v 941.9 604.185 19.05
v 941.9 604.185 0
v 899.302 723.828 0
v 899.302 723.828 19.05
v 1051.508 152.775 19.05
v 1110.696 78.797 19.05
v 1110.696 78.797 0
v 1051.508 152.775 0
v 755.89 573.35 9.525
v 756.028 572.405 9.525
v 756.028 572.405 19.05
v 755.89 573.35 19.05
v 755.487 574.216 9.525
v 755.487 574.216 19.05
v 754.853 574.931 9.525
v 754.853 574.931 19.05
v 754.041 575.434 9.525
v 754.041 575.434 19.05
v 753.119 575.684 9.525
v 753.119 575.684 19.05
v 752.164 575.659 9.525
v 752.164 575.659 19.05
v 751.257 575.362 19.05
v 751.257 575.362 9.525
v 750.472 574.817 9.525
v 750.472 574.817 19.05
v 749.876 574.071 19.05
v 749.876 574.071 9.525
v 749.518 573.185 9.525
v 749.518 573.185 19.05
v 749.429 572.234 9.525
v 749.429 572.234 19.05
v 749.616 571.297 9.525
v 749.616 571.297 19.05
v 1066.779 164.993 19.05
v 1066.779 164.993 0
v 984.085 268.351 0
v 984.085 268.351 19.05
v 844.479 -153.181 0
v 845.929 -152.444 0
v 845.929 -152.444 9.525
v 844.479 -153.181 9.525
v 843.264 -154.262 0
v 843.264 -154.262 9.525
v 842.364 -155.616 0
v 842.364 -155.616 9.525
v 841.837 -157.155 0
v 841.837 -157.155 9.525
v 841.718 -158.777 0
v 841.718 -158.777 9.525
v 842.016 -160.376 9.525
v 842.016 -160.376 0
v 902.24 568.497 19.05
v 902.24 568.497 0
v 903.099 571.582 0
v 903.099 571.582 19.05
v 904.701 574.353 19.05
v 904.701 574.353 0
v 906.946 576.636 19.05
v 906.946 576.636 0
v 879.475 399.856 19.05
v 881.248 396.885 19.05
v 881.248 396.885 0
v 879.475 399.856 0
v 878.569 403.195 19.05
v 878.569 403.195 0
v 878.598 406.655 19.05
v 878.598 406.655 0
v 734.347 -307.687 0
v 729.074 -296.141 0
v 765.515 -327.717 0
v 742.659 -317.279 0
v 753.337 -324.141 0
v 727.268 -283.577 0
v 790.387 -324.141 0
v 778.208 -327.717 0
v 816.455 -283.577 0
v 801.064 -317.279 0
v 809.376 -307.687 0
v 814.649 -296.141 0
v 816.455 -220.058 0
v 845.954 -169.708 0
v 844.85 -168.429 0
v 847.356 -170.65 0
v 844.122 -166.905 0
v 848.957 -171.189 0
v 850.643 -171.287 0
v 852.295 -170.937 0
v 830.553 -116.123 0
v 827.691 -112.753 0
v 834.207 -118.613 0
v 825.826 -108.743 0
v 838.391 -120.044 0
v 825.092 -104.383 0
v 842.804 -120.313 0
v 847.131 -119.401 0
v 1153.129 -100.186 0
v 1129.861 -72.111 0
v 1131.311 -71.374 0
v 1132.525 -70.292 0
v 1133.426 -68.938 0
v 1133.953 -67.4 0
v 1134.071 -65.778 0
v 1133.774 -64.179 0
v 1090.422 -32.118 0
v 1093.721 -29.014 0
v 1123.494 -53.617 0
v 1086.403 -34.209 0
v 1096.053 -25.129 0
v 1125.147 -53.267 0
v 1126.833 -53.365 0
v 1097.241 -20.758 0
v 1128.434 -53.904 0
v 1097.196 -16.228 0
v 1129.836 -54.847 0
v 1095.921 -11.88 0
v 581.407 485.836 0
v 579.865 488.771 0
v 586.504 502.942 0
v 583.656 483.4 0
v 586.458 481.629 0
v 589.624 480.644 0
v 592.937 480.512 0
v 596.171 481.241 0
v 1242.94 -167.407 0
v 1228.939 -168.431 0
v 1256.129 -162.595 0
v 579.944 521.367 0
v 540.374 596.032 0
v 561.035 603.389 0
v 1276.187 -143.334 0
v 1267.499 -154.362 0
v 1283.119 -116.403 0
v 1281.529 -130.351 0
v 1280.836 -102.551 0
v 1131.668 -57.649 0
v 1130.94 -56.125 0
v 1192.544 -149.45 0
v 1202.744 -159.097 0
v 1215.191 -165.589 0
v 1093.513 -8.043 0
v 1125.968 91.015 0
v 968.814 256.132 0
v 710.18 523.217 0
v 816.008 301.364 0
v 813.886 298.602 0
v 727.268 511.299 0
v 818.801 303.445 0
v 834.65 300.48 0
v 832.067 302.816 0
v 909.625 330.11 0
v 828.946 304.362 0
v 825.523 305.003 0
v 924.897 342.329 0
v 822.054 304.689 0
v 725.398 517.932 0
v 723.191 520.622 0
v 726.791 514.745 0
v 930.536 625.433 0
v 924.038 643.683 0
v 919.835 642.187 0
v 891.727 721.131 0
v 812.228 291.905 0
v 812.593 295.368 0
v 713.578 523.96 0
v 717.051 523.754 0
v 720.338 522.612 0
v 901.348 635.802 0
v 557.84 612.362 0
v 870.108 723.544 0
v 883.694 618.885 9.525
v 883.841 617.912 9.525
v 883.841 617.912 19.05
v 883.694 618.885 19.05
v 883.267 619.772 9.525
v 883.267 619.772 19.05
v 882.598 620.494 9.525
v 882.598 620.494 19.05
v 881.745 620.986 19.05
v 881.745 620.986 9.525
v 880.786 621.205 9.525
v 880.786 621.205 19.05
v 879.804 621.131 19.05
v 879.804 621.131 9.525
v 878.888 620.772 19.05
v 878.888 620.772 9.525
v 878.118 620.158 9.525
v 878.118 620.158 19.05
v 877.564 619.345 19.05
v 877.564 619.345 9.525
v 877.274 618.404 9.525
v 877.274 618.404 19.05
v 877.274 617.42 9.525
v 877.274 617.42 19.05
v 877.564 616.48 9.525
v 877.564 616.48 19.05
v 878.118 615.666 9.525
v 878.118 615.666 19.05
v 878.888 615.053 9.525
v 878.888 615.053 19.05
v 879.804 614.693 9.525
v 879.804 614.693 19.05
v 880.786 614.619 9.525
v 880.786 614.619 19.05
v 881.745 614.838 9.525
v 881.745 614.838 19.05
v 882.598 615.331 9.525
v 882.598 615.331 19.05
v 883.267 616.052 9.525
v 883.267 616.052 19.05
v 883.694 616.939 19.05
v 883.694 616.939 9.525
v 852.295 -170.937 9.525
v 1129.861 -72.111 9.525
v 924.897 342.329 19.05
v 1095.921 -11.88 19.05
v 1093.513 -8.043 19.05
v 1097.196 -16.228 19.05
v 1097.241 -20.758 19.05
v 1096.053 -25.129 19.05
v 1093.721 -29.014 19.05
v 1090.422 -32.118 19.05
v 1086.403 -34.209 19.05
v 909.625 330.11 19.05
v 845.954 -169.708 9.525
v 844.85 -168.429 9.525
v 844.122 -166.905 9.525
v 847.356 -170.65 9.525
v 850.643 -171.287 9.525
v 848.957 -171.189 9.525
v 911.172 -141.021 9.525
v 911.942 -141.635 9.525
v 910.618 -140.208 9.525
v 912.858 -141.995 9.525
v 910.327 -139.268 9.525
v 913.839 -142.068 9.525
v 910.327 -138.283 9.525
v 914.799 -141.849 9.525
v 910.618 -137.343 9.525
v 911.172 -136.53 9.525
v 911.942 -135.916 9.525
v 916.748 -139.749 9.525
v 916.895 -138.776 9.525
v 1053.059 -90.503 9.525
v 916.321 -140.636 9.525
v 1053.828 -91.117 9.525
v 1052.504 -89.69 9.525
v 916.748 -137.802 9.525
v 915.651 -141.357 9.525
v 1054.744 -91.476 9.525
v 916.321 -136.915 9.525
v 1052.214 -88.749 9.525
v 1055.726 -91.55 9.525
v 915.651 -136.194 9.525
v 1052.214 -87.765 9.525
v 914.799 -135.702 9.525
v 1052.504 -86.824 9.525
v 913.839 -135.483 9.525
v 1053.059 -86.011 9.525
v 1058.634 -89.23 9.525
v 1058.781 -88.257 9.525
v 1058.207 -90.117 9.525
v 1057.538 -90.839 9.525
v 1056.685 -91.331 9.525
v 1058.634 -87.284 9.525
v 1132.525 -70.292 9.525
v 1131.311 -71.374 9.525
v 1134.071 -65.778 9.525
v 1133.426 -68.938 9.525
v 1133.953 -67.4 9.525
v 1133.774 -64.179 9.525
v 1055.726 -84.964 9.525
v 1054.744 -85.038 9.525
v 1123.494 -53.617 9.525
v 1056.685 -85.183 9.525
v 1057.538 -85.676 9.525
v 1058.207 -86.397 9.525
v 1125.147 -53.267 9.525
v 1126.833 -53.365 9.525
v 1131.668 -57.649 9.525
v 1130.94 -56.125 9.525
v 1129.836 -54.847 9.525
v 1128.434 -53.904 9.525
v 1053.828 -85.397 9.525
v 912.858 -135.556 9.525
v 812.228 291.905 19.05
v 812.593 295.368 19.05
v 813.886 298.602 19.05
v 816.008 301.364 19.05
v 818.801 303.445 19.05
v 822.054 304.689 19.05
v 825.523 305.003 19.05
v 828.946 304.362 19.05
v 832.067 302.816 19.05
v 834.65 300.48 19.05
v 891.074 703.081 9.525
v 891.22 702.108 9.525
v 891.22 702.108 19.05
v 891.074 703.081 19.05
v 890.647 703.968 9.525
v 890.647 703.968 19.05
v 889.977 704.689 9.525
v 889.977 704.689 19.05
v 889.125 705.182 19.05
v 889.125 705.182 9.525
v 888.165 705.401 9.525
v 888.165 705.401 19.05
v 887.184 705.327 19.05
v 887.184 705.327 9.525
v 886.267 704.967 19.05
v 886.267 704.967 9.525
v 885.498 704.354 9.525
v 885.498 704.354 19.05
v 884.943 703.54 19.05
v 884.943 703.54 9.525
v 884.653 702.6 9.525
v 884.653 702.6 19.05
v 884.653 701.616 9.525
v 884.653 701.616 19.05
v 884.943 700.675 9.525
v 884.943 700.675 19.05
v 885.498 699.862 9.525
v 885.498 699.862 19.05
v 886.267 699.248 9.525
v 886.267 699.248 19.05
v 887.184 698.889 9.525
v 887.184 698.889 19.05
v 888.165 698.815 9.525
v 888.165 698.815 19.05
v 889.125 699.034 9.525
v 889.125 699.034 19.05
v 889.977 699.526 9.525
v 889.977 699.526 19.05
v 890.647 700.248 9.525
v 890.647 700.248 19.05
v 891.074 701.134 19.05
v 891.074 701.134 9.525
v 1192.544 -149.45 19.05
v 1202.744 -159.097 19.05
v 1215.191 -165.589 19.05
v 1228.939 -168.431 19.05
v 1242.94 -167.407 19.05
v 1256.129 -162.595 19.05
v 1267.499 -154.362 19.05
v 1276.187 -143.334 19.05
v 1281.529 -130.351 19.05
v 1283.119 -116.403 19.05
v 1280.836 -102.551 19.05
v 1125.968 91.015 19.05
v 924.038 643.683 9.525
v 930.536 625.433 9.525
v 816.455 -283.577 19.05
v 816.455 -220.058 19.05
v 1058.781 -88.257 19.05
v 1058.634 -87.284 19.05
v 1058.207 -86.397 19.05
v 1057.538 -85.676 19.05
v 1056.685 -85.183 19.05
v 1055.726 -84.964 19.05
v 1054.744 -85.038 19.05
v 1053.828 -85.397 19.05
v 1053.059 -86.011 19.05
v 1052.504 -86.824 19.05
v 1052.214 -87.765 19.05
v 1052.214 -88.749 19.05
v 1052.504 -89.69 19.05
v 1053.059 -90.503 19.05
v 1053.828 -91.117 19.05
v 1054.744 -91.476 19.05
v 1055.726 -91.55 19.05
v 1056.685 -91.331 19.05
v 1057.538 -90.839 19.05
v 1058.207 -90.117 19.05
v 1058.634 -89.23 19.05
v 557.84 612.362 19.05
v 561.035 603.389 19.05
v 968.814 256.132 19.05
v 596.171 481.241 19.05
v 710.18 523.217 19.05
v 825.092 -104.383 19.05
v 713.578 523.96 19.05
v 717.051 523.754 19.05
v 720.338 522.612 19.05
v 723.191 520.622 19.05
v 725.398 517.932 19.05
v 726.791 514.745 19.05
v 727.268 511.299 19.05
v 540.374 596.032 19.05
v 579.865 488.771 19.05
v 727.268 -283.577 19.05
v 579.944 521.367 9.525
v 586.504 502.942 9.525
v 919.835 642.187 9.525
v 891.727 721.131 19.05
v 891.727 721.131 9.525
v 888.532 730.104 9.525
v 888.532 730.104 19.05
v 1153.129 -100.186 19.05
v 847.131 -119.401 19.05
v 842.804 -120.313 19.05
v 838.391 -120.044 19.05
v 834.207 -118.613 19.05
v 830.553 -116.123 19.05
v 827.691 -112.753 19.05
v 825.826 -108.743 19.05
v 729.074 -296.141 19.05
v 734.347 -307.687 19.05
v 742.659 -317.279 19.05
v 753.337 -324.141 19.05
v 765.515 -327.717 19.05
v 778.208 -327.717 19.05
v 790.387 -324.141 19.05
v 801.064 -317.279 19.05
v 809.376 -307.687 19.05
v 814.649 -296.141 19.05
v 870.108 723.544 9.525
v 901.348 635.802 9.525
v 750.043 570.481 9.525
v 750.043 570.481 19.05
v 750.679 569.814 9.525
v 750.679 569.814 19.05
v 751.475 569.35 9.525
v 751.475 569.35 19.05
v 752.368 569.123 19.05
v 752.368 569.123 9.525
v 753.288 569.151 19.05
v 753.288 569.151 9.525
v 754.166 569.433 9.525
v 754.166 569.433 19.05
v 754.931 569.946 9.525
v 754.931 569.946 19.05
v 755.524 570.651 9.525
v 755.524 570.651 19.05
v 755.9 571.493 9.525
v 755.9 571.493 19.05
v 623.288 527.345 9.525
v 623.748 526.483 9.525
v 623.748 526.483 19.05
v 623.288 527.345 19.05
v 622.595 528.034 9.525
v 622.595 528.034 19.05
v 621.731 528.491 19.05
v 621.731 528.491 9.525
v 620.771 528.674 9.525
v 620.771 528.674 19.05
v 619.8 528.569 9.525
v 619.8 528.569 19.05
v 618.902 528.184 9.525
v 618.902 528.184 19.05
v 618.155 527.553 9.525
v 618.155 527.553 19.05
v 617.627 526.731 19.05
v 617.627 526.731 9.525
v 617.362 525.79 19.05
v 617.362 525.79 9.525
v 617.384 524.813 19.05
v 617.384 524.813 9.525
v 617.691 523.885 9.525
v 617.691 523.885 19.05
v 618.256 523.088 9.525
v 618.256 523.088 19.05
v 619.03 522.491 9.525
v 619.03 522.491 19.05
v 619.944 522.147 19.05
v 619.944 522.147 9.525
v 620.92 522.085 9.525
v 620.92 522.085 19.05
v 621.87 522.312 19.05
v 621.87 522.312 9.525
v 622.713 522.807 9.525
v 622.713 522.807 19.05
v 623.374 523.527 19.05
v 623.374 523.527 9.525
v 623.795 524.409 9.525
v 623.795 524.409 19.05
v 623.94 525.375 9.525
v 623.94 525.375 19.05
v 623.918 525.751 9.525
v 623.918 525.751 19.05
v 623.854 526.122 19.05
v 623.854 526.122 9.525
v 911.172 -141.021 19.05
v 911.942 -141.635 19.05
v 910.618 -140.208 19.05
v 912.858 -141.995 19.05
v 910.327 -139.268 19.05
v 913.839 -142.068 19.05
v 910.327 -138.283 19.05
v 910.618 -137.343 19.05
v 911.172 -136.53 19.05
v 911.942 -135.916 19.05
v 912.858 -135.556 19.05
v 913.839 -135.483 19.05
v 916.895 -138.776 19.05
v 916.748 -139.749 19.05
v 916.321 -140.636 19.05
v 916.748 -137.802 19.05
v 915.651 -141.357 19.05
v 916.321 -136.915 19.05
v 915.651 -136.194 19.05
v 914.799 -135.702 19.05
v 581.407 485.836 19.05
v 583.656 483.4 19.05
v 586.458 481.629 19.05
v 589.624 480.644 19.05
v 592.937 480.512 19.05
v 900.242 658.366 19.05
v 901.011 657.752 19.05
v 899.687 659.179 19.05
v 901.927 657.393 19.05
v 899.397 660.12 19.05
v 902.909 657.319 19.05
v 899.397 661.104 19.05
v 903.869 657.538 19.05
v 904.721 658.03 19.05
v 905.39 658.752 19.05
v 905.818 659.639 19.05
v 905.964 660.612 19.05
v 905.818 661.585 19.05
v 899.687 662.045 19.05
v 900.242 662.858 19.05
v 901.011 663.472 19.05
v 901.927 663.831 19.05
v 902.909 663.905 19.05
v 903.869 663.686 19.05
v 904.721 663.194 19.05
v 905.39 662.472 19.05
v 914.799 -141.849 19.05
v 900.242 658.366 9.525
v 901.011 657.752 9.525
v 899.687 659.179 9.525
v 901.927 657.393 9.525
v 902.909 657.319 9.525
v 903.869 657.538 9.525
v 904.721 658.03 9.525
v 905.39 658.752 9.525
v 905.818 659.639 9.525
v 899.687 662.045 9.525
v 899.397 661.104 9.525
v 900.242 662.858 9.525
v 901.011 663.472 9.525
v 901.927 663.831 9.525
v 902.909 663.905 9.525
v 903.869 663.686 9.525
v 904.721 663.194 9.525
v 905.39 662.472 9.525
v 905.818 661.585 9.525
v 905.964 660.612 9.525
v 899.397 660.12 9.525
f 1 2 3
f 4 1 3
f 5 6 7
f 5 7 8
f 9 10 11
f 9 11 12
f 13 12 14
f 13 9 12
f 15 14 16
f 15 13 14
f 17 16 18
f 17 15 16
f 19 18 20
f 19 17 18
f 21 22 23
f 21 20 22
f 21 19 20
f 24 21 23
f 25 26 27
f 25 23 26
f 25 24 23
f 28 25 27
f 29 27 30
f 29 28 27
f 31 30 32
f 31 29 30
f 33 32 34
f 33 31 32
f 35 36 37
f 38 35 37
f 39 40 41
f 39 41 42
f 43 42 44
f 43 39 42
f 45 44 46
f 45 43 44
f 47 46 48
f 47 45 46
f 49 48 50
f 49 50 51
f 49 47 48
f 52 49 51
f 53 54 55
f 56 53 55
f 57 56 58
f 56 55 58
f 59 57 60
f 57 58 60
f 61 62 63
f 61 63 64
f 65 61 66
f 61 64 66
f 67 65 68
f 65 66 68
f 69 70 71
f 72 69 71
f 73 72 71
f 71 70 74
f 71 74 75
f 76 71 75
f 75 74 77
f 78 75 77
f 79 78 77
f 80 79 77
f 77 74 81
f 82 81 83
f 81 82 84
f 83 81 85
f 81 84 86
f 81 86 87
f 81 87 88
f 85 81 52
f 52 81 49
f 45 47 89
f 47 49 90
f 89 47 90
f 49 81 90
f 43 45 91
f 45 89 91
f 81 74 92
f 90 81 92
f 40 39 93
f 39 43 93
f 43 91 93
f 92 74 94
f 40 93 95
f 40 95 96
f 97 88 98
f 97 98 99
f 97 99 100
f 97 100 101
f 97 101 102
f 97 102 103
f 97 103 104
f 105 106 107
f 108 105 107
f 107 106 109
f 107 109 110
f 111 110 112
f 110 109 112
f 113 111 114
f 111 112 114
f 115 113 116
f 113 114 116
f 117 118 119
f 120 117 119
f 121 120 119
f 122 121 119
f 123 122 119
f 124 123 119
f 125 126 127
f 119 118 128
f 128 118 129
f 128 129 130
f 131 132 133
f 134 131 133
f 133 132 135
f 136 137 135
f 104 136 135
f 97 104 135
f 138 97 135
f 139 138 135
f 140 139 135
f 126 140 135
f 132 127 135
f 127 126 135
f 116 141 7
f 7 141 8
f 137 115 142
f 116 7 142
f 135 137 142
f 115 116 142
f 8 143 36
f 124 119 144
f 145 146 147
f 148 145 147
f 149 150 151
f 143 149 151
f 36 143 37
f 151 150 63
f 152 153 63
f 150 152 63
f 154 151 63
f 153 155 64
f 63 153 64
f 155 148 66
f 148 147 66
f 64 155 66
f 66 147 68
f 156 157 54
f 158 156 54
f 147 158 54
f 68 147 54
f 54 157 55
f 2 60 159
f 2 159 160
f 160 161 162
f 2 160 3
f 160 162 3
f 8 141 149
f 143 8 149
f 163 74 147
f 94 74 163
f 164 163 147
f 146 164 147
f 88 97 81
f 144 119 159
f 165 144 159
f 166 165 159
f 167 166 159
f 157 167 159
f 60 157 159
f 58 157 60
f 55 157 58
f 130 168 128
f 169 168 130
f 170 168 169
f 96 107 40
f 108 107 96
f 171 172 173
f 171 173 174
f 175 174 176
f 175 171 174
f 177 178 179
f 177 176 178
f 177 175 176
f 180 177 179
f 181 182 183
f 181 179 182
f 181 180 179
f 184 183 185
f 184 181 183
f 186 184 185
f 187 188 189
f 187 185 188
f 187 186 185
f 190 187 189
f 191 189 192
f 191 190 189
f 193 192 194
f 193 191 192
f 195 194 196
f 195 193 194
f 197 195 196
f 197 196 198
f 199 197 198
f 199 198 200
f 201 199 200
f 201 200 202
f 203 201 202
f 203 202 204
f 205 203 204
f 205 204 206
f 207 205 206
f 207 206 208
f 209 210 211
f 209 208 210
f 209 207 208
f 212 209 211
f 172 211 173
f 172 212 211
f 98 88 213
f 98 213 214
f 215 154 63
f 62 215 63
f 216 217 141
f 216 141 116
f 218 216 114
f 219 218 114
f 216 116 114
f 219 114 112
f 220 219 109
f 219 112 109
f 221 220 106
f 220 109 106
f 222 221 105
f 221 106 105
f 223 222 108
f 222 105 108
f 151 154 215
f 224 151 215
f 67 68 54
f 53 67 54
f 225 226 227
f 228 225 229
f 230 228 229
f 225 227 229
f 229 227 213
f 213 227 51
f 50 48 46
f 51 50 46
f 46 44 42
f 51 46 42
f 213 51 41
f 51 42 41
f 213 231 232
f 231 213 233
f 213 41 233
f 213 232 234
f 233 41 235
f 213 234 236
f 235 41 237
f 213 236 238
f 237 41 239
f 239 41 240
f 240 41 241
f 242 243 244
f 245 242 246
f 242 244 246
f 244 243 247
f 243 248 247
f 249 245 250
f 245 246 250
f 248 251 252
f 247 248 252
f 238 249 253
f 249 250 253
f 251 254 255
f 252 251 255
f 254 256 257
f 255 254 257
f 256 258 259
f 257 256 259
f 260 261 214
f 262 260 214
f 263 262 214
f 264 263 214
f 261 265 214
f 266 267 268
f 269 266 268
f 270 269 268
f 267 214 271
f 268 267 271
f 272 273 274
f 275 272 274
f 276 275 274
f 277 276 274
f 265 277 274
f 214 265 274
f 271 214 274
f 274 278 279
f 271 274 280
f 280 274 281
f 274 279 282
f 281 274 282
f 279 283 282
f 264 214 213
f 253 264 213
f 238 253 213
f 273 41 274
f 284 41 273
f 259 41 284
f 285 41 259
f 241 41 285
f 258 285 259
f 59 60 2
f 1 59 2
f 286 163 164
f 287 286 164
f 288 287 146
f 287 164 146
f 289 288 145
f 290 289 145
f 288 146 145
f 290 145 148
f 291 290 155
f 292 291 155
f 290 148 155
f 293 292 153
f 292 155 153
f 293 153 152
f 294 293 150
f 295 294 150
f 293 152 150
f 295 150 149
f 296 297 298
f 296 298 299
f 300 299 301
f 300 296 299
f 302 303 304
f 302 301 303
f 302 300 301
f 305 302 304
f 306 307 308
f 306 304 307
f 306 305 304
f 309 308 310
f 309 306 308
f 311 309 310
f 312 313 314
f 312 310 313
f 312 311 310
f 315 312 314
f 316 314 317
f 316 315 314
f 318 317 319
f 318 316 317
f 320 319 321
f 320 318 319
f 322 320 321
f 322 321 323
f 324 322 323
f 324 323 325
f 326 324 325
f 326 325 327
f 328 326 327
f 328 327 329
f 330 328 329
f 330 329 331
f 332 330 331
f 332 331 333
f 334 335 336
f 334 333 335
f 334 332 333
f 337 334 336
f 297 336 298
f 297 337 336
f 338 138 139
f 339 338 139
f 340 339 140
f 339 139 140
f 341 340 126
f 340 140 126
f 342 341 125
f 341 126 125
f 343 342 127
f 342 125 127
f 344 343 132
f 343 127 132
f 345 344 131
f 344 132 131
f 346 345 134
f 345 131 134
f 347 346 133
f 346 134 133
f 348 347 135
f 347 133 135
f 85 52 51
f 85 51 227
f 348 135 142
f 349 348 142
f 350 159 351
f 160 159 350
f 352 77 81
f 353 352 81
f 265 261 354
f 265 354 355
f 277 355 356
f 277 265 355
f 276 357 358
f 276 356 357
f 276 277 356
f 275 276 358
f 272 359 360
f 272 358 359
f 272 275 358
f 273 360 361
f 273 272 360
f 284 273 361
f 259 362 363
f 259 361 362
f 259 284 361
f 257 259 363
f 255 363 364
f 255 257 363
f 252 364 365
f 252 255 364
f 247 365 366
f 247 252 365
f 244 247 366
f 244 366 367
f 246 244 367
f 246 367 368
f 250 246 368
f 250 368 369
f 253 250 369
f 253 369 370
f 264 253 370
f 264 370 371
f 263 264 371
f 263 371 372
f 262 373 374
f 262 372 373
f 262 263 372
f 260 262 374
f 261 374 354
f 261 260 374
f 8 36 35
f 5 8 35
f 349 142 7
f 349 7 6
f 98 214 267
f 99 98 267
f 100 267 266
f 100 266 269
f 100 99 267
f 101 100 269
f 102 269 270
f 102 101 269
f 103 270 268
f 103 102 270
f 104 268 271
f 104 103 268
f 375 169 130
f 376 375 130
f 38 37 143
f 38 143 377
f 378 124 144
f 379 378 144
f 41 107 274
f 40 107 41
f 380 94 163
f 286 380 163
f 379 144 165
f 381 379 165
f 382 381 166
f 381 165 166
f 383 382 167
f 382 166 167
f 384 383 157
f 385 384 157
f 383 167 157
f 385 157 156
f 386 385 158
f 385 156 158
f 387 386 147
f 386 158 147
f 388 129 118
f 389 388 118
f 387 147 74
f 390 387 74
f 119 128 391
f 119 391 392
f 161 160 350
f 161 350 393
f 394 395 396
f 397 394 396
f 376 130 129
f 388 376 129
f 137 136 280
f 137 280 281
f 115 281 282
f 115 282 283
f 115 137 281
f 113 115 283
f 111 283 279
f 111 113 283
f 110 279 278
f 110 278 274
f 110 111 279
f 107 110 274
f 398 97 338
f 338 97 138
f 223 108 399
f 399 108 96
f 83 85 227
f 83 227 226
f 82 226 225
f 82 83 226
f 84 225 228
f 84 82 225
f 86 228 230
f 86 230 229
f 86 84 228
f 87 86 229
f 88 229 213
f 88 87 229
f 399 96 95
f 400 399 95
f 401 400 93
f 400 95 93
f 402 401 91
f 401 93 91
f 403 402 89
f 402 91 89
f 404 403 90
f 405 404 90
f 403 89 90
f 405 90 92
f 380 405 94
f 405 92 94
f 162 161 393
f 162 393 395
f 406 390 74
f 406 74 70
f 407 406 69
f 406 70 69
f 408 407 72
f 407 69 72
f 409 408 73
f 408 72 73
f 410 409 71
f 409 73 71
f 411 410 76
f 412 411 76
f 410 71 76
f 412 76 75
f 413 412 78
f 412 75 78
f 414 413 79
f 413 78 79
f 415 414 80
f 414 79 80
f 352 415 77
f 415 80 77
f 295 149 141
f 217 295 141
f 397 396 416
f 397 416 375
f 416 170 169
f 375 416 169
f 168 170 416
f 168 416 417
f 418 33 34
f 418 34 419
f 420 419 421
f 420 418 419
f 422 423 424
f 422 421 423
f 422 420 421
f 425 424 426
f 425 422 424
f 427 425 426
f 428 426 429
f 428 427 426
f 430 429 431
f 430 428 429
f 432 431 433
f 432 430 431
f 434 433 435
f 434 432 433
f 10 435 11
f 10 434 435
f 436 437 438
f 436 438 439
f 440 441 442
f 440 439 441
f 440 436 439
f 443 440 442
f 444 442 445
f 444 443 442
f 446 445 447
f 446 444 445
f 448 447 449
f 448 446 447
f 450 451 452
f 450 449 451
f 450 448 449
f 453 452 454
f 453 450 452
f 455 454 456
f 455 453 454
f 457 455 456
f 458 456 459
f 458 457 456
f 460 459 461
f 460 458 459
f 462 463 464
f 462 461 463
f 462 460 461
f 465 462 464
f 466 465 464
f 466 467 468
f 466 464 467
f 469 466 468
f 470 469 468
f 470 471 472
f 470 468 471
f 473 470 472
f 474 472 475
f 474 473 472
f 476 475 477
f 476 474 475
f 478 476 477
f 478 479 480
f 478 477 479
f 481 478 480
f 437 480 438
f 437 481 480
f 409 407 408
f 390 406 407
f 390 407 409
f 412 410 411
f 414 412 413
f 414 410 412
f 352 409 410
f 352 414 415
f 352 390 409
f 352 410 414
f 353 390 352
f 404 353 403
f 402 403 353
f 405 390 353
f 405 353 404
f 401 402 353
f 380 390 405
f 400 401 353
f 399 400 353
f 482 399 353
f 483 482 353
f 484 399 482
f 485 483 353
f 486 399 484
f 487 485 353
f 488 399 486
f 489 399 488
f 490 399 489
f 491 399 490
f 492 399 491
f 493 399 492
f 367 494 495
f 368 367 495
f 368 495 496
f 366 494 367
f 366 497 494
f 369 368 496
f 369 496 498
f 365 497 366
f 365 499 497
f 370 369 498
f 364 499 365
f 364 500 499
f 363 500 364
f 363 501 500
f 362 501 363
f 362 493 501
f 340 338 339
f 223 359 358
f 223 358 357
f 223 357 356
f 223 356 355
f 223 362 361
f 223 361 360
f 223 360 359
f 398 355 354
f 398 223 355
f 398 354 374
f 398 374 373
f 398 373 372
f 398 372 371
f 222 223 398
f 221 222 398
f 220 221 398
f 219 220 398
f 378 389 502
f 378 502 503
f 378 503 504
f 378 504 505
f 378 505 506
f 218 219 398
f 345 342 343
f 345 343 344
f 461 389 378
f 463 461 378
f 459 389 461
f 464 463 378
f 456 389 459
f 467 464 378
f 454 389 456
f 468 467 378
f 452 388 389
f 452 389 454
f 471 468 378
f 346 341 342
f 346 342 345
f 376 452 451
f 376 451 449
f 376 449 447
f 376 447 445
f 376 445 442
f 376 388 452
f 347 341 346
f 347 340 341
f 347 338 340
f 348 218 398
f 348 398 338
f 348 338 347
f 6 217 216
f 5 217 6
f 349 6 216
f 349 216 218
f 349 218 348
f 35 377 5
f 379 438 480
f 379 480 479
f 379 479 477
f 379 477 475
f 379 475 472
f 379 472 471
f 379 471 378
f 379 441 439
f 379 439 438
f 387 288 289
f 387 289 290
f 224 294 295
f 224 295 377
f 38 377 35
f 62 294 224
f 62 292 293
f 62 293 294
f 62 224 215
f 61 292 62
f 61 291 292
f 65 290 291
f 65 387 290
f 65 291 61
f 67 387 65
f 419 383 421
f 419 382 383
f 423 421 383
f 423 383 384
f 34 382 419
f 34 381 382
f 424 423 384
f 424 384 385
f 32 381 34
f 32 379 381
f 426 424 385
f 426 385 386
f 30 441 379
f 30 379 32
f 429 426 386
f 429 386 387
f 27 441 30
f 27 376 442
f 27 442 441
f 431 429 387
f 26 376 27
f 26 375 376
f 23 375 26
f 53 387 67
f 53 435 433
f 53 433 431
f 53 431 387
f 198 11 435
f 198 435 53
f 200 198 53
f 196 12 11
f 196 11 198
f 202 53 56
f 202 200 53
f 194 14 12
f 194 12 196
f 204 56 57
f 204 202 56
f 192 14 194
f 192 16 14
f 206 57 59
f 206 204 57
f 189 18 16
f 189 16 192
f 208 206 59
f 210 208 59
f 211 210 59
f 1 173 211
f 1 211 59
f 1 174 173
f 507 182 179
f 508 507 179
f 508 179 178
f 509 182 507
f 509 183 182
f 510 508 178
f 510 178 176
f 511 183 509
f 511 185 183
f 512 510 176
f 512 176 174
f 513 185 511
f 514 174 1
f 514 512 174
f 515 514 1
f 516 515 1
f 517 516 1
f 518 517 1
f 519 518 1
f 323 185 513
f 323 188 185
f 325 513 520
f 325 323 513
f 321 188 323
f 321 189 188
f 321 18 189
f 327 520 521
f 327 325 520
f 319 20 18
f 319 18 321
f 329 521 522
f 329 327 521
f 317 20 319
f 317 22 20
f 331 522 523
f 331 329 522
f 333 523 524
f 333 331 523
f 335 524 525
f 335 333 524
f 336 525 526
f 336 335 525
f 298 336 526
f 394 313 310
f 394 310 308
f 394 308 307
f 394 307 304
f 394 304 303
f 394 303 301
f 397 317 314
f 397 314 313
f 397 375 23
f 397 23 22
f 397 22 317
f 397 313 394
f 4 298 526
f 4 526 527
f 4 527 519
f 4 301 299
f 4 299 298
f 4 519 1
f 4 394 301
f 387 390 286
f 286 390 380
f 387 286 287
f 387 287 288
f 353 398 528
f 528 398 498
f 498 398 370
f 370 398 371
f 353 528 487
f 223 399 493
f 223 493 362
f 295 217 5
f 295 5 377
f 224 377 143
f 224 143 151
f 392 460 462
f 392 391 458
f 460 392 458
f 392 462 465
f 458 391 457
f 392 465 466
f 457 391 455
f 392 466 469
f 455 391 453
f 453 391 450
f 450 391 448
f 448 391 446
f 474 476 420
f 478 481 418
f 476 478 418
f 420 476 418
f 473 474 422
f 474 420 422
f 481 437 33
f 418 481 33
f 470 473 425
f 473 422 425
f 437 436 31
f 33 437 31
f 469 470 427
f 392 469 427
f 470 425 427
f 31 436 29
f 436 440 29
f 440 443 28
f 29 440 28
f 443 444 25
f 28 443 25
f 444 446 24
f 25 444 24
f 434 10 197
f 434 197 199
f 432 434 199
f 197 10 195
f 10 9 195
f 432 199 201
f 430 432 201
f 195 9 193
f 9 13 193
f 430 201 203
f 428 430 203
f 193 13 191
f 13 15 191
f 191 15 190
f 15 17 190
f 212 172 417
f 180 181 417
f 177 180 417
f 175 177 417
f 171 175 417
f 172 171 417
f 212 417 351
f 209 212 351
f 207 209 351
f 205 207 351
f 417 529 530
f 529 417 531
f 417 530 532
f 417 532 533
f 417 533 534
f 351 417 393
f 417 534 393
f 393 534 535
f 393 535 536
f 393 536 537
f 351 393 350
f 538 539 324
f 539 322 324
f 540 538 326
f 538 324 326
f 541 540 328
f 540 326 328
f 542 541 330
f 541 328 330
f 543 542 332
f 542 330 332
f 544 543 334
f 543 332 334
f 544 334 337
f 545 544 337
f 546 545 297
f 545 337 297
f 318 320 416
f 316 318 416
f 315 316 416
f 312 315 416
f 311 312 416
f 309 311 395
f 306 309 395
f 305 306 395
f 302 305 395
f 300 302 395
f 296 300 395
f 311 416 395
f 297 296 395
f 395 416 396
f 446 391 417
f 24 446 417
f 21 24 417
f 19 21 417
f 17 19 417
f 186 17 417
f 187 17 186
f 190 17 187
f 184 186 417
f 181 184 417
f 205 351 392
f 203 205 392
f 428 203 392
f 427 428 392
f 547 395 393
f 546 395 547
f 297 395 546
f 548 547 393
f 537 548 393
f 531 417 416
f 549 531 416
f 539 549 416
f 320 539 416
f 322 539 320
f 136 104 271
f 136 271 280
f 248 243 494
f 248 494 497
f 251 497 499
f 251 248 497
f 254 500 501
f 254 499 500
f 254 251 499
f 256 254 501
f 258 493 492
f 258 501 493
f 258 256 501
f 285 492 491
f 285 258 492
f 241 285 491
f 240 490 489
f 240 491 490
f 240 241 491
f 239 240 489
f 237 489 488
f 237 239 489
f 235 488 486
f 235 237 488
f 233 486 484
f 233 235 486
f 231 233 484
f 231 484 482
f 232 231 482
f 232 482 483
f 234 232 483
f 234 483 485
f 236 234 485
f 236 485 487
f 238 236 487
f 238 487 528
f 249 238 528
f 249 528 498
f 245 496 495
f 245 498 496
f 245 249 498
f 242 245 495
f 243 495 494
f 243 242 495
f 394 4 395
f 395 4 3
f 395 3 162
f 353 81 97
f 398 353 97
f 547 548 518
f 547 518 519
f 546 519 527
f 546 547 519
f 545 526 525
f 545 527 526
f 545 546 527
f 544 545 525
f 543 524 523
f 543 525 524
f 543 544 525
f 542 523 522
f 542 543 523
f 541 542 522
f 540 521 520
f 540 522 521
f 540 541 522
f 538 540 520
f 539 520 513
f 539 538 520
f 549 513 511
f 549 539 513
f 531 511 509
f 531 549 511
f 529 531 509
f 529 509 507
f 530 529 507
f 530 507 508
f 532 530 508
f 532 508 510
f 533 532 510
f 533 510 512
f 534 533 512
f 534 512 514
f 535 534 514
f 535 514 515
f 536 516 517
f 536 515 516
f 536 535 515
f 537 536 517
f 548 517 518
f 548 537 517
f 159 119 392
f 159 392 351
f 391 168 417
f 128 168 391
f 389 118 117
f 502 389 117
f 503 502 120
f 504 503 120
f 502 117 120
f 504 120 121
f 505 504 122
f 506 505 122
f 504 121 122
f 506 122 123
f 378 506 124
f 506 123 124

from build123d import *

# Parameters (mm, degrees)
F1_DEPTH = 19.05
F3_DEPTH = 9.525
F5_DEPTH = 9.525
F6_W     = 94.742
F6_H     = 19.05
F6_H_2   = 22.0252738774
F7_DEPTH = 19.558
F8_R     = 3.302
F9_DEPTH = 19.051


# Not quite as in the source:
# - a feature names something its author has since deleted; it is built from what else it names


with BuildPart() as f1:
    # F0 (on Top) → F1 (new body)
    with BuildSketch(Plane.XY):
        with BuildLine():
            Line((727.2677384075, 427.9083177516), (727.2677384075, -283.5772421425))
            ThreePointArc((727.2677384075, -283.5772421425), (771.8616098047, -328.1711135397), (816.4554812019, -283.5772421425))
            Line((816.4554812019, -283.5772421425), (816.4554812019, -220.0584400703))
            Line((816.4554812019, -220.0584400703), (1153.129473529, -100.186362138))
            Line((1153.129473529, -100.186362138), (1192.5444383312, -149.4502630935))
            ThreePointArc((1192.5444383312, -149.4502630935), (1256.128693756, -162.5951765711), (1280.8355912672, -102.5508970465))
            Line((1280.8355912672, -102.5508970465), (881.2480453078, 396.8848219998))
            ThreePointArc((881.2480453078, 396.8848219998), (878.9075846932, 401.4943033077), (878.5980767553, 406.6546597539))
            Line((878.5980767553, 406.6546597539), (902.2401524871, 568.497452094))
            ThreePointArc((902.2401524871, 568.497452094), (903.8120375637, 573.0182606597), (906.9455405898, 576.6362285378))
            Line((906.9455405898, 576.6362285378), (941.9003890149, 604.1852707886))
            Line((941.9003890149, 604.1852707886), (899.3018677789, 723.8279303566))
            Line((899.3018677789, 723.8279303566), (891.7270738587, 721.1309406639))
            Line((891.7270738587, 721.1309406639), (888.532184766, 730.1041401315))
            Line((888.532184766, 730.1041401315), (557.8398737201, 612.361827435))
            Line((557.8398737201, 612.361827435), (561.0347628128, 603.3886279674))
            Line((561.0347628128, 603.3886279674), (540.3738890749, 596.0323666485))
            Line((540.3738890749, 596.0323666485), (579.864860977, 488.7712220609))
            ThreePointArc((579.864860977, 488.7712220609), (586.4582383014, 481.6291726364), (596.1706516981, 481.2412028737))
            Line((596.1706516981, 481.2412028737), (710.1798391165, 523.2166417359))
            ThreePointArc((710.1798391165, 523.2166417359), (721.8328511307, 521.7154565085), (727.2677384075, 511.2987273493))
            Line((727.2677384075, 511.2987273493), (727.2677384075, 427.9083177516))
        make_face()
        with BuildLine():
            ThreePointArc((847.13107515, -119.4008734987), (832.2962861388, -117.4908698033), (825.0919590872, -104.3829809246))
            Line((825.0919590872, -104.3829809246), (812.2279623998, 291.9047427935))
            ThreePointArc((812.2279623998, 291.9047427935), (820.3847868922, 304.1789193457), (834.6503380579, 300.4798321914))
            Line((834.6503380579, 300.4798321914), (1093.5127410116, -8.0431735903))
            ThreePointArc((1093.5127410116, -8.0431735903), (1096.7972352344, -22.9844248457), (1086.4027687189, -34.2086823816))
            Line((1086.4027687189, -34.2086823816), (847.13107515, -119.4008734987))
        make_face(mode=Mode.SUBTRACT)
    extrude(amount=F1_DEPTH)

    # F2 (on face) → F3 (cut)
    with BuildSketch(Plane.XY):
        with BuildLine():
            ThreePointArc((844.1222933391, -166.9052020902), (847.3560158569, -170.6500208272), (852.2954479263, -170.9374917442))
            Line((852.2954479263, -170.9374917442), (1129.8610507564, -72.1108335167))
            ThreePointArc((1129.8610507564, -72.1108335167), (1133.425786756, -68.9382065458), (1133.77435322, -64.1788572139))
            Line((1133.77435322, -64.1788572139), (1131.667577719, -57.6492424267))
            ThreePointArc((1131.667577719, -57.6492424267), (1128.4338552012, -53.9044236898), (1123.4944231318, -53.6169527728))
            Line((1123.4944231318, -53.6169527728), (845.9288203018, -152.4436110002))
            ThreePointArc((845.9288203018, -152.4436110002), (842.3640843021, -155.6162379711), (842.0155178382, -160.3755873031))
            Line((842.0155178382, -160.3755873031), (844.1222933391, -166.9052020902))
        make_face()
    extrude(amount=F3_DEPTH, mode=Mode.SUBTRACT)

    # F4 (on face) → F5 (cut)
    with BuildSketch(Plane.XY):
        Polygon((579.9443241227, 521.366756094), (586.5044770697, 502.9417796404), (930.5357275267, 625.4329875525), (924.0377818739, 643.6832473584), (919.8348729601, 642.1868153078), (891.7270738587, 721.1309406639), (888.532184766, 730.1041401315), (870.0541627522, 723.6949228268), (901.3482962404, 635.8015951388), align=None)
    extrude(amount=F5_DEPTH, mode=Mode.SUBTRACT)

    # F6 (on face) → F7 (cut)
    with BuildSketch(Plane(origin=(730.9119602838, 584.7866009261, 0), x_dir=(-0.6247321984, 0.7808390873, 0), z_dir=(0.7808390873, 0.6247321984, 0))):
        with Locations((-357.8801403508, 9.525)):
            Rectangle(F6_W, F6_H)
        with Locations((-584.9891603508, 10.3152221296)):
            Rectangle(F6_W, F6_H_2)
    extrude(amount=-F7_DEPTH, mode=Mode.SUBTRACT)

    # F8 (on face) → F9 (cut, through all)
    with BuildSketch(Plane.XY):
        with Locations((902.6622274527, 660.6120369276)):
            Circle(F8_R)
        with Locations((887.9183335175, 702.107780571)):
            Circle(F8_R)
        with Locations((880.5389518172, 617.9122097817)):
            Circle(F8_R)
        with BuildLine():
            ThreePointArc((623.7483495144, 526.4827509324), (617.3838130375, 524.8132146381), (623.9396392041, 525.3751926427))
            ThreePointArc((623.9396392041, 525.3751926427), (623.8914653707, 525.9371706472), (623.7483495144, 526.4827509324))
        make_face()
        with BuildLine():
            ThreePointArc((756.0284718398, 572.4049919407), (752.1644938352, 575.6588181073), (749.6157615295, 571.2974336509))
            ThreePointArc((749.6157615295, 571.2974336509), (753.2884498444, 569.1511657741), (756.0284718398, 572.4049919407))
        make_face()
        with Locations((1055.4790926394, -88.2571151612)):
            Circle(F8_R)
        with Locations((913.5925848765, -138.7755124943)):
            Circle(F8_R)
    extrude(amount=F9_DEPTH, mode=Mode.SUBTRACT)


solid = f1.part
